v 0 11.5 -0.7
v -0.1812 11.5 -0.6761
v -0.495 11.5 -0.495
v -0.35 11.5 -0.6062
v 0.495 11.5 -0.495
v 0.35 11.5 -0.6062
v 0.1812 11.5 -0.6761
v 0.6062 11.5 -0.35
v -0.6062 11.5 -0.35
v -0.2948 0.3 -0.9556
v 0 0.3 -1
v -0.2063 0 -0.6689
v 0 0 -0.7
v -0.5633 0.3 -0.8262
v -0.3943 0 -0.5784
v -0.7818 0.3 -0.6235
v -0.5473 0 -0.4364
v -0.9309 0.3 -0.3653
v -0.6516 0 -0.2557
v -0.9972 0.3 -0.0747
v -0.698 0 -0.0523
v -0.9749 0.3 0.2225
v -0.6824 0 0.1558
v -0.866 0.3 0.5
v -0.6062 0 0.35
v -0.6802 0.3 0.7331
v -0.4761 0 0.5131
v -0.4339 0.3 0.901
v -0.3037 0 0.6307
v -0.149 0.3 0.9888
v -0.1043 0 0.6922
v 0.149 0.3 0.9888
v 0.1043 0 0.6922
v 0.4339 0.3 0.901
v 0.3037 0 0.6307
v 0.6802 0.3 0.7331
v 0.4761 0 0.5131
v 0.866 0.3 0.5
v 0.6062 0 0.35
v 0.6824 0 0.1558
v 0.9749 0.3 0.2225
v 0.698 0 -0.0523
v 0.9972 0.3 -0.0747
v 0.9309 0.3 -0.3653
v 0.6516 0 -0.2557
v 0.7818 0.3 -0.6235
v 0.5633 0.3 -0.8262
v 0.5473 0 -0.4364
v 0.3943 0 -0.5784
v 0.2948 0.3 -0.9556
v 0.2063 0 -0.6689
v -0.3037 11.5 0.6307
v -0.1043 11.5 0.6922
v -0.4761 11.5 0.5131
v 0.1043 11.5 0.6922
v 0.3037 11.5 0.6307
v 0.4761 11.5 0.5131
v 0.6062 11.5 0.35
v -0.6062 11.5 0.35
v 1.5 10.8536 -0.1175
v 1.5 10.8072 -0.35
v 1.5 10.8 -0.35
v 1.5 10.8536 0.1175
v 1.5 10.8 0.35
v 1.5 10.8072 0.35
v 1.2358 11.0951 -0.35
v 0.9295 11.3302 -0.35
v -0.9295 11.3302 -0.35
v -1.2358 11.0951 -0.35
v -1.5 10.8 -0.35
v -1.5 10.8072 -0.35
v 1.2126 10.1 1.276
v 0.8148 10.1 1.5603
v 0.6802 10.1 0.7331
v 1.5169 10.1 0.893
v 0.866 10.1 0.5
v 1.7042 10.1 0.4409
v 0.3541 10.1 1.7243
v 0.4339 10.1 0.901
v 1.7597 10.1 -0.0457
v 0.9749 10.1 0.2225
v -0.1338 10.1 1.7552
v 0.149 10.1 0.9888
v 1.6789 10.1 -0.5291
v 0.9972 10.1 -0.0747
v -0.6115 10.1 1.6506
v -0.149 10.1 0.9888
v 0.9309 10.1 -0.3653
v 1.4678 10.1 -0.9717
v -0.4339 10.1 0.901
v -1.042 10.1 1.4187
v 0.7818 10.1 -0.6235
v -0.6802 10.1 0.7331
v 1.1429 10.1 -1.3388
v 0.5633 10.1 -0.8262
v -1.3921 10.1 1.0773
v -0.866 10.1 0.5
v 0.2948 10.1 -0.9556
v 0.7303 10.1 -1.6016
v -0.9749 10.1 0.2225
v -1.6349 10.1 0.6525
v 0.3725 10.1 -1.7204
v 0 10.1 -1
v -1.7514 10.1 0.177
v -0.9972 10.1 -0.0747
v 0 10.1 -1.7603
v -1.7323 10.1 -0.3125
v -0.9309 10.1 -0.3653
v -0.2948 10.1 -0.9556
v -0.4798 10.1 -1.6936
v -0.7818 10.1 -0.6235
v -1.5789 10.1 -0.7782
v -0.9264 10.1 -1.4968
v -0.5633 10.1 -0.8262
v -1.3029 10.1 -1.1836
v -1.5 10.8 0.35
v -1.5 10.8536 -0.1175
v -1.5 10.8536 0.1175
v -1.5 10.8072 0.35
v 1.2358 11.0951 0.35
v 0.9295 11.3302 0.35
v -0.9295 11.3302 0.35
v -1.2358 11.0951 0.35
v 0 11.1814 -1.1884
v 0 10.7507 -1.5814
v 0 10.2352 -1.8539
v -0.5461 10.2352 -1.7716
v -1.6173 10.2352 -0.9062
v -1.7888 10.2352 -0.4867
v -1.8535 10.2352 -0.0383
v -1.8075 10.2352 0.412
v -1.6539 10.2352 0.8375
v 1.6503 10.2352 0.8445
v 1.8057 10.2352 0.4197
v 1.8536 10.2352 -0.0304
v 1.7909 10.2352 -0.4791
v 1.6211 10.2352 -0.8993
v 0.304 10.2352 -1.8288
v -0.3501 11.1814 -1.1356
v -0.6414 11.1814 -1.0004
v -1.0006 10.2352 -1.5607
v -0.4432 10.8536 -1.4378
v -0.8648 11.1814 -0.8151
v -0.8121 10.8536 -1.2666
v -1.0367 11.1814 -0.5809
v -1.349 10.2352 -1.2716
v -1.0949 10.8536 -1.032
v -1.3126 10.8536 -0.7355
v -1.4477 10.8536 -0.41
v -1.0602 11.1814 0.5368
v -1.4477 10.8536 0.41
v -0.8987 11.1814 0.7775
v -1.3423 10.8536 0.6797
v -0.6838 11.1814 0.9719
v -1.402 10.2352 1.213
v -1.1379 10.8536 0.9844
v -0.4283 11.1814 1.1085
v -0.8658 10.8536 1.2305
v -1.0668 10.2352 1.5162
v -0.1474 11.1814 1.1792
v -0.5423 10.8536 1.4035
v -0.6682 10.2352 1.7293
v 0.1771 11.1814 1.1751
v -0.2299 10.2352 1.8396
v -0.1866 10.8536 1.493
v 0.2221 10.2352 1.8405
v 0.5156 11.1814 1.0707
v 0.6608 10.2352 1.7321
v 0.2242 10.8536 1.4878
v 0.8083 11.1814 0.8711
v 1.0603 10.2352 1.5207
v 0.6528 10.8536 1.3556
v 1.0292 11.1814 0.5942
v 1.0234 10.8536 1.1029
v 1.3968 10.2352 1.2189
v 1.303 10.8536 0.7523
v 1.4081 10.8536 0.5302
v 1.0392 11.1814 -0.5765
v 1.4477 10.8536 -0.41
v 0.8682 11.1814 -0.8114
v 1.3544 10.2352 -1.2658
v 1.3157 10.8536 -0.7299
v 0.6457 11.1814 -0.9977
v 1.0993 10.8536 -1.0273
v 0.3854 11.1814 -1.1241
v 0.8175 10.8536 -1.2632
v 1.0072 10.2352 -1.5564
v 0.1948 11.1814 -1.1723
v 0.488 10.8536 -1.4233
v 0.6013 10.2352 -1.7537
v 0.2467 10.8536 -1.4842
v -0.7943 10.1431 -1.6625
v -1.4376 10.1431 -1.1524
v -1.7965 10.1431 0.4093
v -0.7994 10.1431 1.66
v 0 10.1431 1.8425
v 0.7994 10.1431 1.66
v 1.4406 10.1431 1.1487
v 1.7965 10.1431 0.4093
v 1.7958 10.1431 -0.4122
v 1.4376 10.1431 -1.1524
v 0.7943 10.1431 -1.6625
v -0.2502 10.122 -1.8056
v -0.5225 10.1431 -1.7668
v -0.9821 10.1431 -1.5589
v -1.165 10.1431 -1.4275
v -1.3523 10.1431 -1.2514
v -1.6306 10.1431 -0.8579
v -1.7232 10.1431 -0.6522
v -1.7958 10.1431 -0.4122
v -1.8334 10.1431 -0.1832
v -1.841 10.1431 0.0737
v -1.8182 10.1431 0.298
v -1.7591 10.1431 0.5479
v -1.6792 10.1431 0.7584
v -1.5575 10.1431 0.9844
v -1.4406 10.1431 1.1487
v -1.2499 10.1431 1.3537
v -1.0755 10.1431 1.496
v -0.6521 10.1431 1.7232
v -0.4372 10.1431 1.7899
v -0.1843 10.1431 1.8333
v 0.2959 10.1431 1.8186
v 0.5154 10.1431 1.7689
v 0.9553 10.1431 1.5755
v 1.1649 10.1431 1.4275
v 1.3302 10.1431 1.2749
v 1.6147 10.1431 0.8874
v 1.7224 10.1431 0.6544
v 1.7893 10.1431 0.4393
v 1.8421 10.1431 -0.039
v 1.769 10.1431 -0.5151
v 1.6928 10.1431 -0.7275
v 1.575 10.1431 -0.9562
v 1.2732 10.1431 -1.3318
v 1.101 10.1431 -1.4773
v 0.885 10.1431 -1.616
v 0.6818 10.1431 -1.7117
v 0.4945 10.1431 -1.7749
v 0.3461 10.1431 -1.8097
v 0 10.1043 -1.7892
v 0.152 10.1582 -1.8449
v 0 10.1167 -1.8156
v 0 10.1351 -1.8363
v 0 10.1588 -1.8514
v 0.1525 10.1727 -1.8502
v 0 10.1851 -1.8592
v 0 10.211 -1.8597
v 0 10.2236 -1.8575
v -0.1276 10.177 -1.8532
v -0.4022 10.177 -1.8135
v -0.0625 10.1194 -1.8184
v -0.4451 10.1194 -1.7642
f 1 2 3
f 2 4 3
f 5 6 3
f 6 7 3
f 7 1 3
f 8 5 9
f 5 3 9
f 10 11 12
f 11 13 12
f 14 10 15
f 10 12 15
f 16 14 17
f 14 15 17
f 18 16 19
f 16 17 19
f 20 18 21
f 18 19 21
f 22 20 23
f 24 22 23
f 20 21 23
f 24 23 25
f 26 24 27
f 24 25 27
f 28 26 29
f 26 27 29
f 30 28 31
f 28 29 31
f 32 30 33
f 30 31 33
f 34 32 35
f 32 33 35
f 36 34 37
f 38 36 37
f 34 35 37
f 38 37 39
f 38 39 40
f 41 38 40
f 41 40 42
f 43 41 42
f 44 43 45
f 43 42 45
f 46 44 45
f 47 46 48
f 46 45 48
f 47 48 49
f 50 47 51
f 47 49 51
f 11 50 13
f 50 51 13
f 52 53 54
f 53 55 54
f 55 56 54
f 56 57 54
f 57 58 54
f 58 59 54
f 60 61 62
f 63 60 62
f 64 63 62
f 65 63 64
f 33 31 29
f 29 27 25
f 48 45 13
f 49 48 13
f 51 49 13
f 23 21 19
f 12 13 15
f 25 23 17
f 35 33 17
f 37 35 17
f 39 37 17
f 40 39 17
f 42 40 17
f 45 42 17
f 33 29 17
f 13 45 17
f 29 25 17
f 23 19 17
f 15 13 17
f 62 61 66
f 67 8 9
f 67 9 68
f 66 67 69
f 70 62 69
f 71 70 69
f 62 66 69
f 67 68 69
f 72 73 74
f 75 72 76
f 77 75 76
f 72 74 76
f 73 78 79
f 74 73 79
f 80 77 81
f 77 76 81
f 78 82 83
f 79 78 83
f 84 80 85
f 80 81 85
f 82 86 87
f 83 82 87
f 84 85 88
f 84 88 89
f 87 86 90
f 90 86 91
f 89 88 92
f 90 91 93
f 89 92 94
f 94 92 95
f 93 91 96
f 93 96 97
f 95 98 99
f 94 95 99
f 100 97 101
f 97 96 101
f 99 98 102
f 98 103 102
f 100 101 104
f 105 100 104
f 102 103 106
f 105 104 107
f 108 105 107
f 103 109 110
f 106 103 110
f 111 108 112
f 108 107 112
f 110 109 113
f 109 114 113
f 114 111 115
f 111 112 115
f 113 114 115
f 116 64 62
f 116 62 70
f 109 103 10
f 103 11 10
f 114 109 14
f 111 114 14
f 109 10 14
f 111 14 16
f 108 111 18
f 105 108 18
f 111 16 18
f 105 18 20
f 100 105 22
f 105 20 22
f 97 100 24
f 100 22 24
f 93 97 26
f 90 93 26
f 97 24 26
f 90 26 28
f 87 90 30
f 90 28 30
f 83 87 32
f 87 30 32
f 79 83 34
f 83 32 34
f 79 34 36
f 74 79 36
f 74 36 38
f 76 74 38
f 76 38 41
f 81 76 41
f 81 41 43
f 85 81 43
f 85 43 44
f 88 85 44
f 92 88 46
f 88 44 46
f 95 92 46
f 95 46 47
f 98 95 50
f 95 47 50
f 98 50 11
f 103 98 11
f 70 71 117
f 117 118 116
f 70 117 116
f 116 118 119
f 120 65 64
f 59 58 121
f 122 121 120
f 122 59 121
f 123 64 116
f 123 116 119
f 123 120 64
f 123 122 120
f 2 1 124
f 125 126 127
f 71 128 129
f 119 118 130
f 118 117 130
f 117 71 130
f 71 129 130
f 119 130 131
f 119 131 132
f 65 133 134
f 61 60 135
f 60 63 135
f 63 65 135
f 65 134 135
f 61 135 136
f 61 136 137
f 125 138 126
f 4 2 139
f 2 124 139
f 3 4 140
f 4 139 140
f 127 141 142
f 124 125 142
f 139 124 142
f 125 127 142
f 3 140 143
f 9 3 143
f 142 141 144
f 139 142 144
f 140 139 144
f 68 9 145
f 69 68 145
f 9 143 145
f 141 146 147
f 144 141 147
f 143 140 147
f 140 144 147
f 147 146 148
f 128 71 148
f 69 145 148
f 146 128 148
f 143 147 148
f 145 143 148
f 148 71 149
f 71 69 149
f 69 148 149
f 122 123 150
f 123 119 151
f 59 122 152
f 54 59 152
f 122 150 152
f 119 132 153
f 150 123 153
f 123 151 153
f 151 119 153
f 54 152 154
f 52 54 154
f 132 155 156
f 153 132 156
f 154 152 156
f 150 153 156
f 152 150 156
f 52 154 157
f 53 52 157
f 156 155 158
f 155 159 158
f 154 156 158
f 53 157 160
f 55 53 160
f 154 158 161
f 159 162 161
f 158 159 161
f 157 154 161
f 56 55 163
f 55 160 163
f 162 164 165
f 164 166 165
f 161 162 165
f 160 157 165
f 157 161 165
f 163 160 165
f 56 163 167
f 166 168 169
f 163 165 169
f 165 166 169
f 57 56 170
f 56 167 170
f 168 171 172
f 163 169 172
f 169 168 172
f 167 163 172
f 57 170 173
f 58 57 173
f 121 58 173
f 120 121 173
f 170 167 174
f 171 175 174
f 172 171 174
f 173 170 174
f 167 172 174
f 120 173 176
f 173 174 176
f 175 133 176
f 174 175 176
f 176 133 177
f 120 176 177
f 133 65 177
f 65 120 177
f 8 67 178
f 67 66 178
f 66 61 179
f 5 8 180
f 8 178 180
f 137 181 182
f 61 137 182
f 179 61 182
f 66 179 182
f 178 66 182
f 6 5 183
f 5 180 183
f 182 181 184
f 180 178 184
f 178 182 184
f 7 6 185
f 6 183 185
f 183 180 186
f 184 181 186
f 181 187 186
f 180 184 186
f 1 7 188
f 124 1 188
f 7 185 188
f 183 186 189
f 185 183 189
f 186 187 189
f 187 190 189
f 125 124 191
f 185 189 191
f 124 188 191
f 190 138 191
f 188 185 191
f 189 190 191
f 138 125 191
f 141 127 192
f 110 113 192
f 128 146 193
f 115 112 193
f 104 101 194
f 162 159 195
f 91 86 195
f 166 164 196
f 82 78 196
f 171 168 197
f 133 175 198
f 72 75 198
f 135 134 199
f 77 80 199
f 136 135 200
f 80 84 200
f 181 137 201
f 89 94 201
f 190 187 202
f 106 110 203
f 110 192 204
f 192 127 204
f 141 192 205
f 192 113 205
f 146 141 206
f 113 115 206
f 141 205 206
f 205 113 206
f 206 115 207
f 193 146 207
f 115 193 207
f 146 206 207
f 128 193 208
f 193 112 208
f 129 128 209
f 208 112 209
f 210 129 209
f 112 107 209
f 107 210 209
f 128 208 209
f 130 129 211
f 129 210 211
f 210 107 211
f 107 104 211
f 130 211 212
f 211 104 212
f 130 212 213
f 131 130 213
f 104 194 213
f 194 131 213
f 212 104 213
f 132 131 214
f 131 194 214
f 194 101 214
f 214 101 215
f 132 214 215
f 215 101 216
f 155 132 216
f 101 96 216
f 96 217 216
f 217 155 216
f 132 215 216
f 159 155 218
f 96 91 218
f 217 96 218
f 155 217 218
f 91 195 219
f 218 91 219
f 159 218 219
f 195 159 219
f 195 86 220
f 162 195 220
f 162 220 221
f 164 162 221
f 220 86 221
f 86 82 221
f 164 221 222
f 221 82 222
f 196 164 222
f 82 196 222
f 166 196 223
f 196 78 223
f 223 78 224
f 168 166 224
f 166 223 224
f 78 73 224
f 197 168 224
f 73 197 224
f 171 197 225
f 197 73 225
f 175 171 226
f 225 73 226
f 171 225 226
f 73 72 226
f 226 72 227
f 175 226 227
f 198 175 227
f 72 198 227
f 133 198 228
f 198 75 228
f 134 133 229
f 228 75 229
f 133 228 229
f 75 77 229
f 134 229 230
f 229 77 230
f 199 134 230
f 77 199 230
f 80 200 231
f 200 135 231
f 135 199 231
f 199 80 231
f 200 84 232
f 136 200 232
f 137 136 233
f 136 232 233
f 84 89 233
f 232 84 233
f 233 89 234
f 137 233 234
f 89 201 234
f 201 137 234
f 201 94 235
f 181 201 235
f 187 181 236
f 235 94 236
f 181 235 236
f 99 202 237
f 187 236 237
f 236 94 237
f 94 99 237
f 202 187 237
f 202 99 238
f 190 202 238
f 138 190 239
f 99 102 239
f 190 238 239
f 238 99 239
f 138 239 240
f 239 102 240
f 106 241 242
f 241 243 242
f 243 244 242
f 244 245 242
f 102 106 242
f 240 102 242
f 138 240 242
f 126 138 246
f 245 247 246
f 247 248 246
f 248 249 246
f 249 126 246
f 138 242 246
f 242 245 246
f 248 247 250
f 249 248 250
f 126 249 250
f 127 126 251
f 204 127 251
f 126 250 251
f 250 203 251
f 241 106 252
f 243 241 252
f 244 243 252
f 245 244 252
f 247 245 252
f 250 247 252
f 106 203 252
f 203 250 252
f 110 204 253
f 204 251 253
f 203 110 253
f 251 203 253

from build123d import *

# Parameters (mm, degrees)
FILLET_1_R          = 0.1
SKETCH_2_W          = 3
SKETCH_2_H          = 0.7
CUT_EXTRUDE_1_DEPTH = 0.7


with BuildPart() as part:
    # Эскиз1 → Повернуть1 (revolve)
    with BuildSketch(Plane.XY):
        with BuildLine():
            Line((1.9, 10.1), (1, 10.1))
            Line((1, 10.1), (1, 0.3))
            Line((1, 0.3), (0.7, 0))
            Line((0.7, 0), (0, 0))
            Line((0, 0), (0, 11.5))
            Line((0, 11.5), (0.7, 11.5))
            ThreePointArc((0.7, 11.5), (1.445839439, 10.925005233), (1.9, 10.1))
        make_face()
    revolve(axis=Axis((0, 0, 0), (0, 1, 0)))

    # Скругление1
    fillet_1_edges = [part.edges().sort_by_distance(p)[0] for p in [
        (-1.9, 10.1, 0),
    ]]
    fillet(fillet_1_edges, radius=FILLET_1_R)

    # Эскиз2 → Вырез-Вытянуть1 (cut)
    with BuildSketch(Plane(origin=(0, 11.5, 0), x_dir=(-1, 0, 0), z_dir=(0, 1, 0))):
        Rectangle(SKETCH_2_W, SKETCH_2_H)
    extrude(amount=-CUT_EXTRUDE_1_DEPTH, mode=Mode.SUBTRACT)


solid = part.part
